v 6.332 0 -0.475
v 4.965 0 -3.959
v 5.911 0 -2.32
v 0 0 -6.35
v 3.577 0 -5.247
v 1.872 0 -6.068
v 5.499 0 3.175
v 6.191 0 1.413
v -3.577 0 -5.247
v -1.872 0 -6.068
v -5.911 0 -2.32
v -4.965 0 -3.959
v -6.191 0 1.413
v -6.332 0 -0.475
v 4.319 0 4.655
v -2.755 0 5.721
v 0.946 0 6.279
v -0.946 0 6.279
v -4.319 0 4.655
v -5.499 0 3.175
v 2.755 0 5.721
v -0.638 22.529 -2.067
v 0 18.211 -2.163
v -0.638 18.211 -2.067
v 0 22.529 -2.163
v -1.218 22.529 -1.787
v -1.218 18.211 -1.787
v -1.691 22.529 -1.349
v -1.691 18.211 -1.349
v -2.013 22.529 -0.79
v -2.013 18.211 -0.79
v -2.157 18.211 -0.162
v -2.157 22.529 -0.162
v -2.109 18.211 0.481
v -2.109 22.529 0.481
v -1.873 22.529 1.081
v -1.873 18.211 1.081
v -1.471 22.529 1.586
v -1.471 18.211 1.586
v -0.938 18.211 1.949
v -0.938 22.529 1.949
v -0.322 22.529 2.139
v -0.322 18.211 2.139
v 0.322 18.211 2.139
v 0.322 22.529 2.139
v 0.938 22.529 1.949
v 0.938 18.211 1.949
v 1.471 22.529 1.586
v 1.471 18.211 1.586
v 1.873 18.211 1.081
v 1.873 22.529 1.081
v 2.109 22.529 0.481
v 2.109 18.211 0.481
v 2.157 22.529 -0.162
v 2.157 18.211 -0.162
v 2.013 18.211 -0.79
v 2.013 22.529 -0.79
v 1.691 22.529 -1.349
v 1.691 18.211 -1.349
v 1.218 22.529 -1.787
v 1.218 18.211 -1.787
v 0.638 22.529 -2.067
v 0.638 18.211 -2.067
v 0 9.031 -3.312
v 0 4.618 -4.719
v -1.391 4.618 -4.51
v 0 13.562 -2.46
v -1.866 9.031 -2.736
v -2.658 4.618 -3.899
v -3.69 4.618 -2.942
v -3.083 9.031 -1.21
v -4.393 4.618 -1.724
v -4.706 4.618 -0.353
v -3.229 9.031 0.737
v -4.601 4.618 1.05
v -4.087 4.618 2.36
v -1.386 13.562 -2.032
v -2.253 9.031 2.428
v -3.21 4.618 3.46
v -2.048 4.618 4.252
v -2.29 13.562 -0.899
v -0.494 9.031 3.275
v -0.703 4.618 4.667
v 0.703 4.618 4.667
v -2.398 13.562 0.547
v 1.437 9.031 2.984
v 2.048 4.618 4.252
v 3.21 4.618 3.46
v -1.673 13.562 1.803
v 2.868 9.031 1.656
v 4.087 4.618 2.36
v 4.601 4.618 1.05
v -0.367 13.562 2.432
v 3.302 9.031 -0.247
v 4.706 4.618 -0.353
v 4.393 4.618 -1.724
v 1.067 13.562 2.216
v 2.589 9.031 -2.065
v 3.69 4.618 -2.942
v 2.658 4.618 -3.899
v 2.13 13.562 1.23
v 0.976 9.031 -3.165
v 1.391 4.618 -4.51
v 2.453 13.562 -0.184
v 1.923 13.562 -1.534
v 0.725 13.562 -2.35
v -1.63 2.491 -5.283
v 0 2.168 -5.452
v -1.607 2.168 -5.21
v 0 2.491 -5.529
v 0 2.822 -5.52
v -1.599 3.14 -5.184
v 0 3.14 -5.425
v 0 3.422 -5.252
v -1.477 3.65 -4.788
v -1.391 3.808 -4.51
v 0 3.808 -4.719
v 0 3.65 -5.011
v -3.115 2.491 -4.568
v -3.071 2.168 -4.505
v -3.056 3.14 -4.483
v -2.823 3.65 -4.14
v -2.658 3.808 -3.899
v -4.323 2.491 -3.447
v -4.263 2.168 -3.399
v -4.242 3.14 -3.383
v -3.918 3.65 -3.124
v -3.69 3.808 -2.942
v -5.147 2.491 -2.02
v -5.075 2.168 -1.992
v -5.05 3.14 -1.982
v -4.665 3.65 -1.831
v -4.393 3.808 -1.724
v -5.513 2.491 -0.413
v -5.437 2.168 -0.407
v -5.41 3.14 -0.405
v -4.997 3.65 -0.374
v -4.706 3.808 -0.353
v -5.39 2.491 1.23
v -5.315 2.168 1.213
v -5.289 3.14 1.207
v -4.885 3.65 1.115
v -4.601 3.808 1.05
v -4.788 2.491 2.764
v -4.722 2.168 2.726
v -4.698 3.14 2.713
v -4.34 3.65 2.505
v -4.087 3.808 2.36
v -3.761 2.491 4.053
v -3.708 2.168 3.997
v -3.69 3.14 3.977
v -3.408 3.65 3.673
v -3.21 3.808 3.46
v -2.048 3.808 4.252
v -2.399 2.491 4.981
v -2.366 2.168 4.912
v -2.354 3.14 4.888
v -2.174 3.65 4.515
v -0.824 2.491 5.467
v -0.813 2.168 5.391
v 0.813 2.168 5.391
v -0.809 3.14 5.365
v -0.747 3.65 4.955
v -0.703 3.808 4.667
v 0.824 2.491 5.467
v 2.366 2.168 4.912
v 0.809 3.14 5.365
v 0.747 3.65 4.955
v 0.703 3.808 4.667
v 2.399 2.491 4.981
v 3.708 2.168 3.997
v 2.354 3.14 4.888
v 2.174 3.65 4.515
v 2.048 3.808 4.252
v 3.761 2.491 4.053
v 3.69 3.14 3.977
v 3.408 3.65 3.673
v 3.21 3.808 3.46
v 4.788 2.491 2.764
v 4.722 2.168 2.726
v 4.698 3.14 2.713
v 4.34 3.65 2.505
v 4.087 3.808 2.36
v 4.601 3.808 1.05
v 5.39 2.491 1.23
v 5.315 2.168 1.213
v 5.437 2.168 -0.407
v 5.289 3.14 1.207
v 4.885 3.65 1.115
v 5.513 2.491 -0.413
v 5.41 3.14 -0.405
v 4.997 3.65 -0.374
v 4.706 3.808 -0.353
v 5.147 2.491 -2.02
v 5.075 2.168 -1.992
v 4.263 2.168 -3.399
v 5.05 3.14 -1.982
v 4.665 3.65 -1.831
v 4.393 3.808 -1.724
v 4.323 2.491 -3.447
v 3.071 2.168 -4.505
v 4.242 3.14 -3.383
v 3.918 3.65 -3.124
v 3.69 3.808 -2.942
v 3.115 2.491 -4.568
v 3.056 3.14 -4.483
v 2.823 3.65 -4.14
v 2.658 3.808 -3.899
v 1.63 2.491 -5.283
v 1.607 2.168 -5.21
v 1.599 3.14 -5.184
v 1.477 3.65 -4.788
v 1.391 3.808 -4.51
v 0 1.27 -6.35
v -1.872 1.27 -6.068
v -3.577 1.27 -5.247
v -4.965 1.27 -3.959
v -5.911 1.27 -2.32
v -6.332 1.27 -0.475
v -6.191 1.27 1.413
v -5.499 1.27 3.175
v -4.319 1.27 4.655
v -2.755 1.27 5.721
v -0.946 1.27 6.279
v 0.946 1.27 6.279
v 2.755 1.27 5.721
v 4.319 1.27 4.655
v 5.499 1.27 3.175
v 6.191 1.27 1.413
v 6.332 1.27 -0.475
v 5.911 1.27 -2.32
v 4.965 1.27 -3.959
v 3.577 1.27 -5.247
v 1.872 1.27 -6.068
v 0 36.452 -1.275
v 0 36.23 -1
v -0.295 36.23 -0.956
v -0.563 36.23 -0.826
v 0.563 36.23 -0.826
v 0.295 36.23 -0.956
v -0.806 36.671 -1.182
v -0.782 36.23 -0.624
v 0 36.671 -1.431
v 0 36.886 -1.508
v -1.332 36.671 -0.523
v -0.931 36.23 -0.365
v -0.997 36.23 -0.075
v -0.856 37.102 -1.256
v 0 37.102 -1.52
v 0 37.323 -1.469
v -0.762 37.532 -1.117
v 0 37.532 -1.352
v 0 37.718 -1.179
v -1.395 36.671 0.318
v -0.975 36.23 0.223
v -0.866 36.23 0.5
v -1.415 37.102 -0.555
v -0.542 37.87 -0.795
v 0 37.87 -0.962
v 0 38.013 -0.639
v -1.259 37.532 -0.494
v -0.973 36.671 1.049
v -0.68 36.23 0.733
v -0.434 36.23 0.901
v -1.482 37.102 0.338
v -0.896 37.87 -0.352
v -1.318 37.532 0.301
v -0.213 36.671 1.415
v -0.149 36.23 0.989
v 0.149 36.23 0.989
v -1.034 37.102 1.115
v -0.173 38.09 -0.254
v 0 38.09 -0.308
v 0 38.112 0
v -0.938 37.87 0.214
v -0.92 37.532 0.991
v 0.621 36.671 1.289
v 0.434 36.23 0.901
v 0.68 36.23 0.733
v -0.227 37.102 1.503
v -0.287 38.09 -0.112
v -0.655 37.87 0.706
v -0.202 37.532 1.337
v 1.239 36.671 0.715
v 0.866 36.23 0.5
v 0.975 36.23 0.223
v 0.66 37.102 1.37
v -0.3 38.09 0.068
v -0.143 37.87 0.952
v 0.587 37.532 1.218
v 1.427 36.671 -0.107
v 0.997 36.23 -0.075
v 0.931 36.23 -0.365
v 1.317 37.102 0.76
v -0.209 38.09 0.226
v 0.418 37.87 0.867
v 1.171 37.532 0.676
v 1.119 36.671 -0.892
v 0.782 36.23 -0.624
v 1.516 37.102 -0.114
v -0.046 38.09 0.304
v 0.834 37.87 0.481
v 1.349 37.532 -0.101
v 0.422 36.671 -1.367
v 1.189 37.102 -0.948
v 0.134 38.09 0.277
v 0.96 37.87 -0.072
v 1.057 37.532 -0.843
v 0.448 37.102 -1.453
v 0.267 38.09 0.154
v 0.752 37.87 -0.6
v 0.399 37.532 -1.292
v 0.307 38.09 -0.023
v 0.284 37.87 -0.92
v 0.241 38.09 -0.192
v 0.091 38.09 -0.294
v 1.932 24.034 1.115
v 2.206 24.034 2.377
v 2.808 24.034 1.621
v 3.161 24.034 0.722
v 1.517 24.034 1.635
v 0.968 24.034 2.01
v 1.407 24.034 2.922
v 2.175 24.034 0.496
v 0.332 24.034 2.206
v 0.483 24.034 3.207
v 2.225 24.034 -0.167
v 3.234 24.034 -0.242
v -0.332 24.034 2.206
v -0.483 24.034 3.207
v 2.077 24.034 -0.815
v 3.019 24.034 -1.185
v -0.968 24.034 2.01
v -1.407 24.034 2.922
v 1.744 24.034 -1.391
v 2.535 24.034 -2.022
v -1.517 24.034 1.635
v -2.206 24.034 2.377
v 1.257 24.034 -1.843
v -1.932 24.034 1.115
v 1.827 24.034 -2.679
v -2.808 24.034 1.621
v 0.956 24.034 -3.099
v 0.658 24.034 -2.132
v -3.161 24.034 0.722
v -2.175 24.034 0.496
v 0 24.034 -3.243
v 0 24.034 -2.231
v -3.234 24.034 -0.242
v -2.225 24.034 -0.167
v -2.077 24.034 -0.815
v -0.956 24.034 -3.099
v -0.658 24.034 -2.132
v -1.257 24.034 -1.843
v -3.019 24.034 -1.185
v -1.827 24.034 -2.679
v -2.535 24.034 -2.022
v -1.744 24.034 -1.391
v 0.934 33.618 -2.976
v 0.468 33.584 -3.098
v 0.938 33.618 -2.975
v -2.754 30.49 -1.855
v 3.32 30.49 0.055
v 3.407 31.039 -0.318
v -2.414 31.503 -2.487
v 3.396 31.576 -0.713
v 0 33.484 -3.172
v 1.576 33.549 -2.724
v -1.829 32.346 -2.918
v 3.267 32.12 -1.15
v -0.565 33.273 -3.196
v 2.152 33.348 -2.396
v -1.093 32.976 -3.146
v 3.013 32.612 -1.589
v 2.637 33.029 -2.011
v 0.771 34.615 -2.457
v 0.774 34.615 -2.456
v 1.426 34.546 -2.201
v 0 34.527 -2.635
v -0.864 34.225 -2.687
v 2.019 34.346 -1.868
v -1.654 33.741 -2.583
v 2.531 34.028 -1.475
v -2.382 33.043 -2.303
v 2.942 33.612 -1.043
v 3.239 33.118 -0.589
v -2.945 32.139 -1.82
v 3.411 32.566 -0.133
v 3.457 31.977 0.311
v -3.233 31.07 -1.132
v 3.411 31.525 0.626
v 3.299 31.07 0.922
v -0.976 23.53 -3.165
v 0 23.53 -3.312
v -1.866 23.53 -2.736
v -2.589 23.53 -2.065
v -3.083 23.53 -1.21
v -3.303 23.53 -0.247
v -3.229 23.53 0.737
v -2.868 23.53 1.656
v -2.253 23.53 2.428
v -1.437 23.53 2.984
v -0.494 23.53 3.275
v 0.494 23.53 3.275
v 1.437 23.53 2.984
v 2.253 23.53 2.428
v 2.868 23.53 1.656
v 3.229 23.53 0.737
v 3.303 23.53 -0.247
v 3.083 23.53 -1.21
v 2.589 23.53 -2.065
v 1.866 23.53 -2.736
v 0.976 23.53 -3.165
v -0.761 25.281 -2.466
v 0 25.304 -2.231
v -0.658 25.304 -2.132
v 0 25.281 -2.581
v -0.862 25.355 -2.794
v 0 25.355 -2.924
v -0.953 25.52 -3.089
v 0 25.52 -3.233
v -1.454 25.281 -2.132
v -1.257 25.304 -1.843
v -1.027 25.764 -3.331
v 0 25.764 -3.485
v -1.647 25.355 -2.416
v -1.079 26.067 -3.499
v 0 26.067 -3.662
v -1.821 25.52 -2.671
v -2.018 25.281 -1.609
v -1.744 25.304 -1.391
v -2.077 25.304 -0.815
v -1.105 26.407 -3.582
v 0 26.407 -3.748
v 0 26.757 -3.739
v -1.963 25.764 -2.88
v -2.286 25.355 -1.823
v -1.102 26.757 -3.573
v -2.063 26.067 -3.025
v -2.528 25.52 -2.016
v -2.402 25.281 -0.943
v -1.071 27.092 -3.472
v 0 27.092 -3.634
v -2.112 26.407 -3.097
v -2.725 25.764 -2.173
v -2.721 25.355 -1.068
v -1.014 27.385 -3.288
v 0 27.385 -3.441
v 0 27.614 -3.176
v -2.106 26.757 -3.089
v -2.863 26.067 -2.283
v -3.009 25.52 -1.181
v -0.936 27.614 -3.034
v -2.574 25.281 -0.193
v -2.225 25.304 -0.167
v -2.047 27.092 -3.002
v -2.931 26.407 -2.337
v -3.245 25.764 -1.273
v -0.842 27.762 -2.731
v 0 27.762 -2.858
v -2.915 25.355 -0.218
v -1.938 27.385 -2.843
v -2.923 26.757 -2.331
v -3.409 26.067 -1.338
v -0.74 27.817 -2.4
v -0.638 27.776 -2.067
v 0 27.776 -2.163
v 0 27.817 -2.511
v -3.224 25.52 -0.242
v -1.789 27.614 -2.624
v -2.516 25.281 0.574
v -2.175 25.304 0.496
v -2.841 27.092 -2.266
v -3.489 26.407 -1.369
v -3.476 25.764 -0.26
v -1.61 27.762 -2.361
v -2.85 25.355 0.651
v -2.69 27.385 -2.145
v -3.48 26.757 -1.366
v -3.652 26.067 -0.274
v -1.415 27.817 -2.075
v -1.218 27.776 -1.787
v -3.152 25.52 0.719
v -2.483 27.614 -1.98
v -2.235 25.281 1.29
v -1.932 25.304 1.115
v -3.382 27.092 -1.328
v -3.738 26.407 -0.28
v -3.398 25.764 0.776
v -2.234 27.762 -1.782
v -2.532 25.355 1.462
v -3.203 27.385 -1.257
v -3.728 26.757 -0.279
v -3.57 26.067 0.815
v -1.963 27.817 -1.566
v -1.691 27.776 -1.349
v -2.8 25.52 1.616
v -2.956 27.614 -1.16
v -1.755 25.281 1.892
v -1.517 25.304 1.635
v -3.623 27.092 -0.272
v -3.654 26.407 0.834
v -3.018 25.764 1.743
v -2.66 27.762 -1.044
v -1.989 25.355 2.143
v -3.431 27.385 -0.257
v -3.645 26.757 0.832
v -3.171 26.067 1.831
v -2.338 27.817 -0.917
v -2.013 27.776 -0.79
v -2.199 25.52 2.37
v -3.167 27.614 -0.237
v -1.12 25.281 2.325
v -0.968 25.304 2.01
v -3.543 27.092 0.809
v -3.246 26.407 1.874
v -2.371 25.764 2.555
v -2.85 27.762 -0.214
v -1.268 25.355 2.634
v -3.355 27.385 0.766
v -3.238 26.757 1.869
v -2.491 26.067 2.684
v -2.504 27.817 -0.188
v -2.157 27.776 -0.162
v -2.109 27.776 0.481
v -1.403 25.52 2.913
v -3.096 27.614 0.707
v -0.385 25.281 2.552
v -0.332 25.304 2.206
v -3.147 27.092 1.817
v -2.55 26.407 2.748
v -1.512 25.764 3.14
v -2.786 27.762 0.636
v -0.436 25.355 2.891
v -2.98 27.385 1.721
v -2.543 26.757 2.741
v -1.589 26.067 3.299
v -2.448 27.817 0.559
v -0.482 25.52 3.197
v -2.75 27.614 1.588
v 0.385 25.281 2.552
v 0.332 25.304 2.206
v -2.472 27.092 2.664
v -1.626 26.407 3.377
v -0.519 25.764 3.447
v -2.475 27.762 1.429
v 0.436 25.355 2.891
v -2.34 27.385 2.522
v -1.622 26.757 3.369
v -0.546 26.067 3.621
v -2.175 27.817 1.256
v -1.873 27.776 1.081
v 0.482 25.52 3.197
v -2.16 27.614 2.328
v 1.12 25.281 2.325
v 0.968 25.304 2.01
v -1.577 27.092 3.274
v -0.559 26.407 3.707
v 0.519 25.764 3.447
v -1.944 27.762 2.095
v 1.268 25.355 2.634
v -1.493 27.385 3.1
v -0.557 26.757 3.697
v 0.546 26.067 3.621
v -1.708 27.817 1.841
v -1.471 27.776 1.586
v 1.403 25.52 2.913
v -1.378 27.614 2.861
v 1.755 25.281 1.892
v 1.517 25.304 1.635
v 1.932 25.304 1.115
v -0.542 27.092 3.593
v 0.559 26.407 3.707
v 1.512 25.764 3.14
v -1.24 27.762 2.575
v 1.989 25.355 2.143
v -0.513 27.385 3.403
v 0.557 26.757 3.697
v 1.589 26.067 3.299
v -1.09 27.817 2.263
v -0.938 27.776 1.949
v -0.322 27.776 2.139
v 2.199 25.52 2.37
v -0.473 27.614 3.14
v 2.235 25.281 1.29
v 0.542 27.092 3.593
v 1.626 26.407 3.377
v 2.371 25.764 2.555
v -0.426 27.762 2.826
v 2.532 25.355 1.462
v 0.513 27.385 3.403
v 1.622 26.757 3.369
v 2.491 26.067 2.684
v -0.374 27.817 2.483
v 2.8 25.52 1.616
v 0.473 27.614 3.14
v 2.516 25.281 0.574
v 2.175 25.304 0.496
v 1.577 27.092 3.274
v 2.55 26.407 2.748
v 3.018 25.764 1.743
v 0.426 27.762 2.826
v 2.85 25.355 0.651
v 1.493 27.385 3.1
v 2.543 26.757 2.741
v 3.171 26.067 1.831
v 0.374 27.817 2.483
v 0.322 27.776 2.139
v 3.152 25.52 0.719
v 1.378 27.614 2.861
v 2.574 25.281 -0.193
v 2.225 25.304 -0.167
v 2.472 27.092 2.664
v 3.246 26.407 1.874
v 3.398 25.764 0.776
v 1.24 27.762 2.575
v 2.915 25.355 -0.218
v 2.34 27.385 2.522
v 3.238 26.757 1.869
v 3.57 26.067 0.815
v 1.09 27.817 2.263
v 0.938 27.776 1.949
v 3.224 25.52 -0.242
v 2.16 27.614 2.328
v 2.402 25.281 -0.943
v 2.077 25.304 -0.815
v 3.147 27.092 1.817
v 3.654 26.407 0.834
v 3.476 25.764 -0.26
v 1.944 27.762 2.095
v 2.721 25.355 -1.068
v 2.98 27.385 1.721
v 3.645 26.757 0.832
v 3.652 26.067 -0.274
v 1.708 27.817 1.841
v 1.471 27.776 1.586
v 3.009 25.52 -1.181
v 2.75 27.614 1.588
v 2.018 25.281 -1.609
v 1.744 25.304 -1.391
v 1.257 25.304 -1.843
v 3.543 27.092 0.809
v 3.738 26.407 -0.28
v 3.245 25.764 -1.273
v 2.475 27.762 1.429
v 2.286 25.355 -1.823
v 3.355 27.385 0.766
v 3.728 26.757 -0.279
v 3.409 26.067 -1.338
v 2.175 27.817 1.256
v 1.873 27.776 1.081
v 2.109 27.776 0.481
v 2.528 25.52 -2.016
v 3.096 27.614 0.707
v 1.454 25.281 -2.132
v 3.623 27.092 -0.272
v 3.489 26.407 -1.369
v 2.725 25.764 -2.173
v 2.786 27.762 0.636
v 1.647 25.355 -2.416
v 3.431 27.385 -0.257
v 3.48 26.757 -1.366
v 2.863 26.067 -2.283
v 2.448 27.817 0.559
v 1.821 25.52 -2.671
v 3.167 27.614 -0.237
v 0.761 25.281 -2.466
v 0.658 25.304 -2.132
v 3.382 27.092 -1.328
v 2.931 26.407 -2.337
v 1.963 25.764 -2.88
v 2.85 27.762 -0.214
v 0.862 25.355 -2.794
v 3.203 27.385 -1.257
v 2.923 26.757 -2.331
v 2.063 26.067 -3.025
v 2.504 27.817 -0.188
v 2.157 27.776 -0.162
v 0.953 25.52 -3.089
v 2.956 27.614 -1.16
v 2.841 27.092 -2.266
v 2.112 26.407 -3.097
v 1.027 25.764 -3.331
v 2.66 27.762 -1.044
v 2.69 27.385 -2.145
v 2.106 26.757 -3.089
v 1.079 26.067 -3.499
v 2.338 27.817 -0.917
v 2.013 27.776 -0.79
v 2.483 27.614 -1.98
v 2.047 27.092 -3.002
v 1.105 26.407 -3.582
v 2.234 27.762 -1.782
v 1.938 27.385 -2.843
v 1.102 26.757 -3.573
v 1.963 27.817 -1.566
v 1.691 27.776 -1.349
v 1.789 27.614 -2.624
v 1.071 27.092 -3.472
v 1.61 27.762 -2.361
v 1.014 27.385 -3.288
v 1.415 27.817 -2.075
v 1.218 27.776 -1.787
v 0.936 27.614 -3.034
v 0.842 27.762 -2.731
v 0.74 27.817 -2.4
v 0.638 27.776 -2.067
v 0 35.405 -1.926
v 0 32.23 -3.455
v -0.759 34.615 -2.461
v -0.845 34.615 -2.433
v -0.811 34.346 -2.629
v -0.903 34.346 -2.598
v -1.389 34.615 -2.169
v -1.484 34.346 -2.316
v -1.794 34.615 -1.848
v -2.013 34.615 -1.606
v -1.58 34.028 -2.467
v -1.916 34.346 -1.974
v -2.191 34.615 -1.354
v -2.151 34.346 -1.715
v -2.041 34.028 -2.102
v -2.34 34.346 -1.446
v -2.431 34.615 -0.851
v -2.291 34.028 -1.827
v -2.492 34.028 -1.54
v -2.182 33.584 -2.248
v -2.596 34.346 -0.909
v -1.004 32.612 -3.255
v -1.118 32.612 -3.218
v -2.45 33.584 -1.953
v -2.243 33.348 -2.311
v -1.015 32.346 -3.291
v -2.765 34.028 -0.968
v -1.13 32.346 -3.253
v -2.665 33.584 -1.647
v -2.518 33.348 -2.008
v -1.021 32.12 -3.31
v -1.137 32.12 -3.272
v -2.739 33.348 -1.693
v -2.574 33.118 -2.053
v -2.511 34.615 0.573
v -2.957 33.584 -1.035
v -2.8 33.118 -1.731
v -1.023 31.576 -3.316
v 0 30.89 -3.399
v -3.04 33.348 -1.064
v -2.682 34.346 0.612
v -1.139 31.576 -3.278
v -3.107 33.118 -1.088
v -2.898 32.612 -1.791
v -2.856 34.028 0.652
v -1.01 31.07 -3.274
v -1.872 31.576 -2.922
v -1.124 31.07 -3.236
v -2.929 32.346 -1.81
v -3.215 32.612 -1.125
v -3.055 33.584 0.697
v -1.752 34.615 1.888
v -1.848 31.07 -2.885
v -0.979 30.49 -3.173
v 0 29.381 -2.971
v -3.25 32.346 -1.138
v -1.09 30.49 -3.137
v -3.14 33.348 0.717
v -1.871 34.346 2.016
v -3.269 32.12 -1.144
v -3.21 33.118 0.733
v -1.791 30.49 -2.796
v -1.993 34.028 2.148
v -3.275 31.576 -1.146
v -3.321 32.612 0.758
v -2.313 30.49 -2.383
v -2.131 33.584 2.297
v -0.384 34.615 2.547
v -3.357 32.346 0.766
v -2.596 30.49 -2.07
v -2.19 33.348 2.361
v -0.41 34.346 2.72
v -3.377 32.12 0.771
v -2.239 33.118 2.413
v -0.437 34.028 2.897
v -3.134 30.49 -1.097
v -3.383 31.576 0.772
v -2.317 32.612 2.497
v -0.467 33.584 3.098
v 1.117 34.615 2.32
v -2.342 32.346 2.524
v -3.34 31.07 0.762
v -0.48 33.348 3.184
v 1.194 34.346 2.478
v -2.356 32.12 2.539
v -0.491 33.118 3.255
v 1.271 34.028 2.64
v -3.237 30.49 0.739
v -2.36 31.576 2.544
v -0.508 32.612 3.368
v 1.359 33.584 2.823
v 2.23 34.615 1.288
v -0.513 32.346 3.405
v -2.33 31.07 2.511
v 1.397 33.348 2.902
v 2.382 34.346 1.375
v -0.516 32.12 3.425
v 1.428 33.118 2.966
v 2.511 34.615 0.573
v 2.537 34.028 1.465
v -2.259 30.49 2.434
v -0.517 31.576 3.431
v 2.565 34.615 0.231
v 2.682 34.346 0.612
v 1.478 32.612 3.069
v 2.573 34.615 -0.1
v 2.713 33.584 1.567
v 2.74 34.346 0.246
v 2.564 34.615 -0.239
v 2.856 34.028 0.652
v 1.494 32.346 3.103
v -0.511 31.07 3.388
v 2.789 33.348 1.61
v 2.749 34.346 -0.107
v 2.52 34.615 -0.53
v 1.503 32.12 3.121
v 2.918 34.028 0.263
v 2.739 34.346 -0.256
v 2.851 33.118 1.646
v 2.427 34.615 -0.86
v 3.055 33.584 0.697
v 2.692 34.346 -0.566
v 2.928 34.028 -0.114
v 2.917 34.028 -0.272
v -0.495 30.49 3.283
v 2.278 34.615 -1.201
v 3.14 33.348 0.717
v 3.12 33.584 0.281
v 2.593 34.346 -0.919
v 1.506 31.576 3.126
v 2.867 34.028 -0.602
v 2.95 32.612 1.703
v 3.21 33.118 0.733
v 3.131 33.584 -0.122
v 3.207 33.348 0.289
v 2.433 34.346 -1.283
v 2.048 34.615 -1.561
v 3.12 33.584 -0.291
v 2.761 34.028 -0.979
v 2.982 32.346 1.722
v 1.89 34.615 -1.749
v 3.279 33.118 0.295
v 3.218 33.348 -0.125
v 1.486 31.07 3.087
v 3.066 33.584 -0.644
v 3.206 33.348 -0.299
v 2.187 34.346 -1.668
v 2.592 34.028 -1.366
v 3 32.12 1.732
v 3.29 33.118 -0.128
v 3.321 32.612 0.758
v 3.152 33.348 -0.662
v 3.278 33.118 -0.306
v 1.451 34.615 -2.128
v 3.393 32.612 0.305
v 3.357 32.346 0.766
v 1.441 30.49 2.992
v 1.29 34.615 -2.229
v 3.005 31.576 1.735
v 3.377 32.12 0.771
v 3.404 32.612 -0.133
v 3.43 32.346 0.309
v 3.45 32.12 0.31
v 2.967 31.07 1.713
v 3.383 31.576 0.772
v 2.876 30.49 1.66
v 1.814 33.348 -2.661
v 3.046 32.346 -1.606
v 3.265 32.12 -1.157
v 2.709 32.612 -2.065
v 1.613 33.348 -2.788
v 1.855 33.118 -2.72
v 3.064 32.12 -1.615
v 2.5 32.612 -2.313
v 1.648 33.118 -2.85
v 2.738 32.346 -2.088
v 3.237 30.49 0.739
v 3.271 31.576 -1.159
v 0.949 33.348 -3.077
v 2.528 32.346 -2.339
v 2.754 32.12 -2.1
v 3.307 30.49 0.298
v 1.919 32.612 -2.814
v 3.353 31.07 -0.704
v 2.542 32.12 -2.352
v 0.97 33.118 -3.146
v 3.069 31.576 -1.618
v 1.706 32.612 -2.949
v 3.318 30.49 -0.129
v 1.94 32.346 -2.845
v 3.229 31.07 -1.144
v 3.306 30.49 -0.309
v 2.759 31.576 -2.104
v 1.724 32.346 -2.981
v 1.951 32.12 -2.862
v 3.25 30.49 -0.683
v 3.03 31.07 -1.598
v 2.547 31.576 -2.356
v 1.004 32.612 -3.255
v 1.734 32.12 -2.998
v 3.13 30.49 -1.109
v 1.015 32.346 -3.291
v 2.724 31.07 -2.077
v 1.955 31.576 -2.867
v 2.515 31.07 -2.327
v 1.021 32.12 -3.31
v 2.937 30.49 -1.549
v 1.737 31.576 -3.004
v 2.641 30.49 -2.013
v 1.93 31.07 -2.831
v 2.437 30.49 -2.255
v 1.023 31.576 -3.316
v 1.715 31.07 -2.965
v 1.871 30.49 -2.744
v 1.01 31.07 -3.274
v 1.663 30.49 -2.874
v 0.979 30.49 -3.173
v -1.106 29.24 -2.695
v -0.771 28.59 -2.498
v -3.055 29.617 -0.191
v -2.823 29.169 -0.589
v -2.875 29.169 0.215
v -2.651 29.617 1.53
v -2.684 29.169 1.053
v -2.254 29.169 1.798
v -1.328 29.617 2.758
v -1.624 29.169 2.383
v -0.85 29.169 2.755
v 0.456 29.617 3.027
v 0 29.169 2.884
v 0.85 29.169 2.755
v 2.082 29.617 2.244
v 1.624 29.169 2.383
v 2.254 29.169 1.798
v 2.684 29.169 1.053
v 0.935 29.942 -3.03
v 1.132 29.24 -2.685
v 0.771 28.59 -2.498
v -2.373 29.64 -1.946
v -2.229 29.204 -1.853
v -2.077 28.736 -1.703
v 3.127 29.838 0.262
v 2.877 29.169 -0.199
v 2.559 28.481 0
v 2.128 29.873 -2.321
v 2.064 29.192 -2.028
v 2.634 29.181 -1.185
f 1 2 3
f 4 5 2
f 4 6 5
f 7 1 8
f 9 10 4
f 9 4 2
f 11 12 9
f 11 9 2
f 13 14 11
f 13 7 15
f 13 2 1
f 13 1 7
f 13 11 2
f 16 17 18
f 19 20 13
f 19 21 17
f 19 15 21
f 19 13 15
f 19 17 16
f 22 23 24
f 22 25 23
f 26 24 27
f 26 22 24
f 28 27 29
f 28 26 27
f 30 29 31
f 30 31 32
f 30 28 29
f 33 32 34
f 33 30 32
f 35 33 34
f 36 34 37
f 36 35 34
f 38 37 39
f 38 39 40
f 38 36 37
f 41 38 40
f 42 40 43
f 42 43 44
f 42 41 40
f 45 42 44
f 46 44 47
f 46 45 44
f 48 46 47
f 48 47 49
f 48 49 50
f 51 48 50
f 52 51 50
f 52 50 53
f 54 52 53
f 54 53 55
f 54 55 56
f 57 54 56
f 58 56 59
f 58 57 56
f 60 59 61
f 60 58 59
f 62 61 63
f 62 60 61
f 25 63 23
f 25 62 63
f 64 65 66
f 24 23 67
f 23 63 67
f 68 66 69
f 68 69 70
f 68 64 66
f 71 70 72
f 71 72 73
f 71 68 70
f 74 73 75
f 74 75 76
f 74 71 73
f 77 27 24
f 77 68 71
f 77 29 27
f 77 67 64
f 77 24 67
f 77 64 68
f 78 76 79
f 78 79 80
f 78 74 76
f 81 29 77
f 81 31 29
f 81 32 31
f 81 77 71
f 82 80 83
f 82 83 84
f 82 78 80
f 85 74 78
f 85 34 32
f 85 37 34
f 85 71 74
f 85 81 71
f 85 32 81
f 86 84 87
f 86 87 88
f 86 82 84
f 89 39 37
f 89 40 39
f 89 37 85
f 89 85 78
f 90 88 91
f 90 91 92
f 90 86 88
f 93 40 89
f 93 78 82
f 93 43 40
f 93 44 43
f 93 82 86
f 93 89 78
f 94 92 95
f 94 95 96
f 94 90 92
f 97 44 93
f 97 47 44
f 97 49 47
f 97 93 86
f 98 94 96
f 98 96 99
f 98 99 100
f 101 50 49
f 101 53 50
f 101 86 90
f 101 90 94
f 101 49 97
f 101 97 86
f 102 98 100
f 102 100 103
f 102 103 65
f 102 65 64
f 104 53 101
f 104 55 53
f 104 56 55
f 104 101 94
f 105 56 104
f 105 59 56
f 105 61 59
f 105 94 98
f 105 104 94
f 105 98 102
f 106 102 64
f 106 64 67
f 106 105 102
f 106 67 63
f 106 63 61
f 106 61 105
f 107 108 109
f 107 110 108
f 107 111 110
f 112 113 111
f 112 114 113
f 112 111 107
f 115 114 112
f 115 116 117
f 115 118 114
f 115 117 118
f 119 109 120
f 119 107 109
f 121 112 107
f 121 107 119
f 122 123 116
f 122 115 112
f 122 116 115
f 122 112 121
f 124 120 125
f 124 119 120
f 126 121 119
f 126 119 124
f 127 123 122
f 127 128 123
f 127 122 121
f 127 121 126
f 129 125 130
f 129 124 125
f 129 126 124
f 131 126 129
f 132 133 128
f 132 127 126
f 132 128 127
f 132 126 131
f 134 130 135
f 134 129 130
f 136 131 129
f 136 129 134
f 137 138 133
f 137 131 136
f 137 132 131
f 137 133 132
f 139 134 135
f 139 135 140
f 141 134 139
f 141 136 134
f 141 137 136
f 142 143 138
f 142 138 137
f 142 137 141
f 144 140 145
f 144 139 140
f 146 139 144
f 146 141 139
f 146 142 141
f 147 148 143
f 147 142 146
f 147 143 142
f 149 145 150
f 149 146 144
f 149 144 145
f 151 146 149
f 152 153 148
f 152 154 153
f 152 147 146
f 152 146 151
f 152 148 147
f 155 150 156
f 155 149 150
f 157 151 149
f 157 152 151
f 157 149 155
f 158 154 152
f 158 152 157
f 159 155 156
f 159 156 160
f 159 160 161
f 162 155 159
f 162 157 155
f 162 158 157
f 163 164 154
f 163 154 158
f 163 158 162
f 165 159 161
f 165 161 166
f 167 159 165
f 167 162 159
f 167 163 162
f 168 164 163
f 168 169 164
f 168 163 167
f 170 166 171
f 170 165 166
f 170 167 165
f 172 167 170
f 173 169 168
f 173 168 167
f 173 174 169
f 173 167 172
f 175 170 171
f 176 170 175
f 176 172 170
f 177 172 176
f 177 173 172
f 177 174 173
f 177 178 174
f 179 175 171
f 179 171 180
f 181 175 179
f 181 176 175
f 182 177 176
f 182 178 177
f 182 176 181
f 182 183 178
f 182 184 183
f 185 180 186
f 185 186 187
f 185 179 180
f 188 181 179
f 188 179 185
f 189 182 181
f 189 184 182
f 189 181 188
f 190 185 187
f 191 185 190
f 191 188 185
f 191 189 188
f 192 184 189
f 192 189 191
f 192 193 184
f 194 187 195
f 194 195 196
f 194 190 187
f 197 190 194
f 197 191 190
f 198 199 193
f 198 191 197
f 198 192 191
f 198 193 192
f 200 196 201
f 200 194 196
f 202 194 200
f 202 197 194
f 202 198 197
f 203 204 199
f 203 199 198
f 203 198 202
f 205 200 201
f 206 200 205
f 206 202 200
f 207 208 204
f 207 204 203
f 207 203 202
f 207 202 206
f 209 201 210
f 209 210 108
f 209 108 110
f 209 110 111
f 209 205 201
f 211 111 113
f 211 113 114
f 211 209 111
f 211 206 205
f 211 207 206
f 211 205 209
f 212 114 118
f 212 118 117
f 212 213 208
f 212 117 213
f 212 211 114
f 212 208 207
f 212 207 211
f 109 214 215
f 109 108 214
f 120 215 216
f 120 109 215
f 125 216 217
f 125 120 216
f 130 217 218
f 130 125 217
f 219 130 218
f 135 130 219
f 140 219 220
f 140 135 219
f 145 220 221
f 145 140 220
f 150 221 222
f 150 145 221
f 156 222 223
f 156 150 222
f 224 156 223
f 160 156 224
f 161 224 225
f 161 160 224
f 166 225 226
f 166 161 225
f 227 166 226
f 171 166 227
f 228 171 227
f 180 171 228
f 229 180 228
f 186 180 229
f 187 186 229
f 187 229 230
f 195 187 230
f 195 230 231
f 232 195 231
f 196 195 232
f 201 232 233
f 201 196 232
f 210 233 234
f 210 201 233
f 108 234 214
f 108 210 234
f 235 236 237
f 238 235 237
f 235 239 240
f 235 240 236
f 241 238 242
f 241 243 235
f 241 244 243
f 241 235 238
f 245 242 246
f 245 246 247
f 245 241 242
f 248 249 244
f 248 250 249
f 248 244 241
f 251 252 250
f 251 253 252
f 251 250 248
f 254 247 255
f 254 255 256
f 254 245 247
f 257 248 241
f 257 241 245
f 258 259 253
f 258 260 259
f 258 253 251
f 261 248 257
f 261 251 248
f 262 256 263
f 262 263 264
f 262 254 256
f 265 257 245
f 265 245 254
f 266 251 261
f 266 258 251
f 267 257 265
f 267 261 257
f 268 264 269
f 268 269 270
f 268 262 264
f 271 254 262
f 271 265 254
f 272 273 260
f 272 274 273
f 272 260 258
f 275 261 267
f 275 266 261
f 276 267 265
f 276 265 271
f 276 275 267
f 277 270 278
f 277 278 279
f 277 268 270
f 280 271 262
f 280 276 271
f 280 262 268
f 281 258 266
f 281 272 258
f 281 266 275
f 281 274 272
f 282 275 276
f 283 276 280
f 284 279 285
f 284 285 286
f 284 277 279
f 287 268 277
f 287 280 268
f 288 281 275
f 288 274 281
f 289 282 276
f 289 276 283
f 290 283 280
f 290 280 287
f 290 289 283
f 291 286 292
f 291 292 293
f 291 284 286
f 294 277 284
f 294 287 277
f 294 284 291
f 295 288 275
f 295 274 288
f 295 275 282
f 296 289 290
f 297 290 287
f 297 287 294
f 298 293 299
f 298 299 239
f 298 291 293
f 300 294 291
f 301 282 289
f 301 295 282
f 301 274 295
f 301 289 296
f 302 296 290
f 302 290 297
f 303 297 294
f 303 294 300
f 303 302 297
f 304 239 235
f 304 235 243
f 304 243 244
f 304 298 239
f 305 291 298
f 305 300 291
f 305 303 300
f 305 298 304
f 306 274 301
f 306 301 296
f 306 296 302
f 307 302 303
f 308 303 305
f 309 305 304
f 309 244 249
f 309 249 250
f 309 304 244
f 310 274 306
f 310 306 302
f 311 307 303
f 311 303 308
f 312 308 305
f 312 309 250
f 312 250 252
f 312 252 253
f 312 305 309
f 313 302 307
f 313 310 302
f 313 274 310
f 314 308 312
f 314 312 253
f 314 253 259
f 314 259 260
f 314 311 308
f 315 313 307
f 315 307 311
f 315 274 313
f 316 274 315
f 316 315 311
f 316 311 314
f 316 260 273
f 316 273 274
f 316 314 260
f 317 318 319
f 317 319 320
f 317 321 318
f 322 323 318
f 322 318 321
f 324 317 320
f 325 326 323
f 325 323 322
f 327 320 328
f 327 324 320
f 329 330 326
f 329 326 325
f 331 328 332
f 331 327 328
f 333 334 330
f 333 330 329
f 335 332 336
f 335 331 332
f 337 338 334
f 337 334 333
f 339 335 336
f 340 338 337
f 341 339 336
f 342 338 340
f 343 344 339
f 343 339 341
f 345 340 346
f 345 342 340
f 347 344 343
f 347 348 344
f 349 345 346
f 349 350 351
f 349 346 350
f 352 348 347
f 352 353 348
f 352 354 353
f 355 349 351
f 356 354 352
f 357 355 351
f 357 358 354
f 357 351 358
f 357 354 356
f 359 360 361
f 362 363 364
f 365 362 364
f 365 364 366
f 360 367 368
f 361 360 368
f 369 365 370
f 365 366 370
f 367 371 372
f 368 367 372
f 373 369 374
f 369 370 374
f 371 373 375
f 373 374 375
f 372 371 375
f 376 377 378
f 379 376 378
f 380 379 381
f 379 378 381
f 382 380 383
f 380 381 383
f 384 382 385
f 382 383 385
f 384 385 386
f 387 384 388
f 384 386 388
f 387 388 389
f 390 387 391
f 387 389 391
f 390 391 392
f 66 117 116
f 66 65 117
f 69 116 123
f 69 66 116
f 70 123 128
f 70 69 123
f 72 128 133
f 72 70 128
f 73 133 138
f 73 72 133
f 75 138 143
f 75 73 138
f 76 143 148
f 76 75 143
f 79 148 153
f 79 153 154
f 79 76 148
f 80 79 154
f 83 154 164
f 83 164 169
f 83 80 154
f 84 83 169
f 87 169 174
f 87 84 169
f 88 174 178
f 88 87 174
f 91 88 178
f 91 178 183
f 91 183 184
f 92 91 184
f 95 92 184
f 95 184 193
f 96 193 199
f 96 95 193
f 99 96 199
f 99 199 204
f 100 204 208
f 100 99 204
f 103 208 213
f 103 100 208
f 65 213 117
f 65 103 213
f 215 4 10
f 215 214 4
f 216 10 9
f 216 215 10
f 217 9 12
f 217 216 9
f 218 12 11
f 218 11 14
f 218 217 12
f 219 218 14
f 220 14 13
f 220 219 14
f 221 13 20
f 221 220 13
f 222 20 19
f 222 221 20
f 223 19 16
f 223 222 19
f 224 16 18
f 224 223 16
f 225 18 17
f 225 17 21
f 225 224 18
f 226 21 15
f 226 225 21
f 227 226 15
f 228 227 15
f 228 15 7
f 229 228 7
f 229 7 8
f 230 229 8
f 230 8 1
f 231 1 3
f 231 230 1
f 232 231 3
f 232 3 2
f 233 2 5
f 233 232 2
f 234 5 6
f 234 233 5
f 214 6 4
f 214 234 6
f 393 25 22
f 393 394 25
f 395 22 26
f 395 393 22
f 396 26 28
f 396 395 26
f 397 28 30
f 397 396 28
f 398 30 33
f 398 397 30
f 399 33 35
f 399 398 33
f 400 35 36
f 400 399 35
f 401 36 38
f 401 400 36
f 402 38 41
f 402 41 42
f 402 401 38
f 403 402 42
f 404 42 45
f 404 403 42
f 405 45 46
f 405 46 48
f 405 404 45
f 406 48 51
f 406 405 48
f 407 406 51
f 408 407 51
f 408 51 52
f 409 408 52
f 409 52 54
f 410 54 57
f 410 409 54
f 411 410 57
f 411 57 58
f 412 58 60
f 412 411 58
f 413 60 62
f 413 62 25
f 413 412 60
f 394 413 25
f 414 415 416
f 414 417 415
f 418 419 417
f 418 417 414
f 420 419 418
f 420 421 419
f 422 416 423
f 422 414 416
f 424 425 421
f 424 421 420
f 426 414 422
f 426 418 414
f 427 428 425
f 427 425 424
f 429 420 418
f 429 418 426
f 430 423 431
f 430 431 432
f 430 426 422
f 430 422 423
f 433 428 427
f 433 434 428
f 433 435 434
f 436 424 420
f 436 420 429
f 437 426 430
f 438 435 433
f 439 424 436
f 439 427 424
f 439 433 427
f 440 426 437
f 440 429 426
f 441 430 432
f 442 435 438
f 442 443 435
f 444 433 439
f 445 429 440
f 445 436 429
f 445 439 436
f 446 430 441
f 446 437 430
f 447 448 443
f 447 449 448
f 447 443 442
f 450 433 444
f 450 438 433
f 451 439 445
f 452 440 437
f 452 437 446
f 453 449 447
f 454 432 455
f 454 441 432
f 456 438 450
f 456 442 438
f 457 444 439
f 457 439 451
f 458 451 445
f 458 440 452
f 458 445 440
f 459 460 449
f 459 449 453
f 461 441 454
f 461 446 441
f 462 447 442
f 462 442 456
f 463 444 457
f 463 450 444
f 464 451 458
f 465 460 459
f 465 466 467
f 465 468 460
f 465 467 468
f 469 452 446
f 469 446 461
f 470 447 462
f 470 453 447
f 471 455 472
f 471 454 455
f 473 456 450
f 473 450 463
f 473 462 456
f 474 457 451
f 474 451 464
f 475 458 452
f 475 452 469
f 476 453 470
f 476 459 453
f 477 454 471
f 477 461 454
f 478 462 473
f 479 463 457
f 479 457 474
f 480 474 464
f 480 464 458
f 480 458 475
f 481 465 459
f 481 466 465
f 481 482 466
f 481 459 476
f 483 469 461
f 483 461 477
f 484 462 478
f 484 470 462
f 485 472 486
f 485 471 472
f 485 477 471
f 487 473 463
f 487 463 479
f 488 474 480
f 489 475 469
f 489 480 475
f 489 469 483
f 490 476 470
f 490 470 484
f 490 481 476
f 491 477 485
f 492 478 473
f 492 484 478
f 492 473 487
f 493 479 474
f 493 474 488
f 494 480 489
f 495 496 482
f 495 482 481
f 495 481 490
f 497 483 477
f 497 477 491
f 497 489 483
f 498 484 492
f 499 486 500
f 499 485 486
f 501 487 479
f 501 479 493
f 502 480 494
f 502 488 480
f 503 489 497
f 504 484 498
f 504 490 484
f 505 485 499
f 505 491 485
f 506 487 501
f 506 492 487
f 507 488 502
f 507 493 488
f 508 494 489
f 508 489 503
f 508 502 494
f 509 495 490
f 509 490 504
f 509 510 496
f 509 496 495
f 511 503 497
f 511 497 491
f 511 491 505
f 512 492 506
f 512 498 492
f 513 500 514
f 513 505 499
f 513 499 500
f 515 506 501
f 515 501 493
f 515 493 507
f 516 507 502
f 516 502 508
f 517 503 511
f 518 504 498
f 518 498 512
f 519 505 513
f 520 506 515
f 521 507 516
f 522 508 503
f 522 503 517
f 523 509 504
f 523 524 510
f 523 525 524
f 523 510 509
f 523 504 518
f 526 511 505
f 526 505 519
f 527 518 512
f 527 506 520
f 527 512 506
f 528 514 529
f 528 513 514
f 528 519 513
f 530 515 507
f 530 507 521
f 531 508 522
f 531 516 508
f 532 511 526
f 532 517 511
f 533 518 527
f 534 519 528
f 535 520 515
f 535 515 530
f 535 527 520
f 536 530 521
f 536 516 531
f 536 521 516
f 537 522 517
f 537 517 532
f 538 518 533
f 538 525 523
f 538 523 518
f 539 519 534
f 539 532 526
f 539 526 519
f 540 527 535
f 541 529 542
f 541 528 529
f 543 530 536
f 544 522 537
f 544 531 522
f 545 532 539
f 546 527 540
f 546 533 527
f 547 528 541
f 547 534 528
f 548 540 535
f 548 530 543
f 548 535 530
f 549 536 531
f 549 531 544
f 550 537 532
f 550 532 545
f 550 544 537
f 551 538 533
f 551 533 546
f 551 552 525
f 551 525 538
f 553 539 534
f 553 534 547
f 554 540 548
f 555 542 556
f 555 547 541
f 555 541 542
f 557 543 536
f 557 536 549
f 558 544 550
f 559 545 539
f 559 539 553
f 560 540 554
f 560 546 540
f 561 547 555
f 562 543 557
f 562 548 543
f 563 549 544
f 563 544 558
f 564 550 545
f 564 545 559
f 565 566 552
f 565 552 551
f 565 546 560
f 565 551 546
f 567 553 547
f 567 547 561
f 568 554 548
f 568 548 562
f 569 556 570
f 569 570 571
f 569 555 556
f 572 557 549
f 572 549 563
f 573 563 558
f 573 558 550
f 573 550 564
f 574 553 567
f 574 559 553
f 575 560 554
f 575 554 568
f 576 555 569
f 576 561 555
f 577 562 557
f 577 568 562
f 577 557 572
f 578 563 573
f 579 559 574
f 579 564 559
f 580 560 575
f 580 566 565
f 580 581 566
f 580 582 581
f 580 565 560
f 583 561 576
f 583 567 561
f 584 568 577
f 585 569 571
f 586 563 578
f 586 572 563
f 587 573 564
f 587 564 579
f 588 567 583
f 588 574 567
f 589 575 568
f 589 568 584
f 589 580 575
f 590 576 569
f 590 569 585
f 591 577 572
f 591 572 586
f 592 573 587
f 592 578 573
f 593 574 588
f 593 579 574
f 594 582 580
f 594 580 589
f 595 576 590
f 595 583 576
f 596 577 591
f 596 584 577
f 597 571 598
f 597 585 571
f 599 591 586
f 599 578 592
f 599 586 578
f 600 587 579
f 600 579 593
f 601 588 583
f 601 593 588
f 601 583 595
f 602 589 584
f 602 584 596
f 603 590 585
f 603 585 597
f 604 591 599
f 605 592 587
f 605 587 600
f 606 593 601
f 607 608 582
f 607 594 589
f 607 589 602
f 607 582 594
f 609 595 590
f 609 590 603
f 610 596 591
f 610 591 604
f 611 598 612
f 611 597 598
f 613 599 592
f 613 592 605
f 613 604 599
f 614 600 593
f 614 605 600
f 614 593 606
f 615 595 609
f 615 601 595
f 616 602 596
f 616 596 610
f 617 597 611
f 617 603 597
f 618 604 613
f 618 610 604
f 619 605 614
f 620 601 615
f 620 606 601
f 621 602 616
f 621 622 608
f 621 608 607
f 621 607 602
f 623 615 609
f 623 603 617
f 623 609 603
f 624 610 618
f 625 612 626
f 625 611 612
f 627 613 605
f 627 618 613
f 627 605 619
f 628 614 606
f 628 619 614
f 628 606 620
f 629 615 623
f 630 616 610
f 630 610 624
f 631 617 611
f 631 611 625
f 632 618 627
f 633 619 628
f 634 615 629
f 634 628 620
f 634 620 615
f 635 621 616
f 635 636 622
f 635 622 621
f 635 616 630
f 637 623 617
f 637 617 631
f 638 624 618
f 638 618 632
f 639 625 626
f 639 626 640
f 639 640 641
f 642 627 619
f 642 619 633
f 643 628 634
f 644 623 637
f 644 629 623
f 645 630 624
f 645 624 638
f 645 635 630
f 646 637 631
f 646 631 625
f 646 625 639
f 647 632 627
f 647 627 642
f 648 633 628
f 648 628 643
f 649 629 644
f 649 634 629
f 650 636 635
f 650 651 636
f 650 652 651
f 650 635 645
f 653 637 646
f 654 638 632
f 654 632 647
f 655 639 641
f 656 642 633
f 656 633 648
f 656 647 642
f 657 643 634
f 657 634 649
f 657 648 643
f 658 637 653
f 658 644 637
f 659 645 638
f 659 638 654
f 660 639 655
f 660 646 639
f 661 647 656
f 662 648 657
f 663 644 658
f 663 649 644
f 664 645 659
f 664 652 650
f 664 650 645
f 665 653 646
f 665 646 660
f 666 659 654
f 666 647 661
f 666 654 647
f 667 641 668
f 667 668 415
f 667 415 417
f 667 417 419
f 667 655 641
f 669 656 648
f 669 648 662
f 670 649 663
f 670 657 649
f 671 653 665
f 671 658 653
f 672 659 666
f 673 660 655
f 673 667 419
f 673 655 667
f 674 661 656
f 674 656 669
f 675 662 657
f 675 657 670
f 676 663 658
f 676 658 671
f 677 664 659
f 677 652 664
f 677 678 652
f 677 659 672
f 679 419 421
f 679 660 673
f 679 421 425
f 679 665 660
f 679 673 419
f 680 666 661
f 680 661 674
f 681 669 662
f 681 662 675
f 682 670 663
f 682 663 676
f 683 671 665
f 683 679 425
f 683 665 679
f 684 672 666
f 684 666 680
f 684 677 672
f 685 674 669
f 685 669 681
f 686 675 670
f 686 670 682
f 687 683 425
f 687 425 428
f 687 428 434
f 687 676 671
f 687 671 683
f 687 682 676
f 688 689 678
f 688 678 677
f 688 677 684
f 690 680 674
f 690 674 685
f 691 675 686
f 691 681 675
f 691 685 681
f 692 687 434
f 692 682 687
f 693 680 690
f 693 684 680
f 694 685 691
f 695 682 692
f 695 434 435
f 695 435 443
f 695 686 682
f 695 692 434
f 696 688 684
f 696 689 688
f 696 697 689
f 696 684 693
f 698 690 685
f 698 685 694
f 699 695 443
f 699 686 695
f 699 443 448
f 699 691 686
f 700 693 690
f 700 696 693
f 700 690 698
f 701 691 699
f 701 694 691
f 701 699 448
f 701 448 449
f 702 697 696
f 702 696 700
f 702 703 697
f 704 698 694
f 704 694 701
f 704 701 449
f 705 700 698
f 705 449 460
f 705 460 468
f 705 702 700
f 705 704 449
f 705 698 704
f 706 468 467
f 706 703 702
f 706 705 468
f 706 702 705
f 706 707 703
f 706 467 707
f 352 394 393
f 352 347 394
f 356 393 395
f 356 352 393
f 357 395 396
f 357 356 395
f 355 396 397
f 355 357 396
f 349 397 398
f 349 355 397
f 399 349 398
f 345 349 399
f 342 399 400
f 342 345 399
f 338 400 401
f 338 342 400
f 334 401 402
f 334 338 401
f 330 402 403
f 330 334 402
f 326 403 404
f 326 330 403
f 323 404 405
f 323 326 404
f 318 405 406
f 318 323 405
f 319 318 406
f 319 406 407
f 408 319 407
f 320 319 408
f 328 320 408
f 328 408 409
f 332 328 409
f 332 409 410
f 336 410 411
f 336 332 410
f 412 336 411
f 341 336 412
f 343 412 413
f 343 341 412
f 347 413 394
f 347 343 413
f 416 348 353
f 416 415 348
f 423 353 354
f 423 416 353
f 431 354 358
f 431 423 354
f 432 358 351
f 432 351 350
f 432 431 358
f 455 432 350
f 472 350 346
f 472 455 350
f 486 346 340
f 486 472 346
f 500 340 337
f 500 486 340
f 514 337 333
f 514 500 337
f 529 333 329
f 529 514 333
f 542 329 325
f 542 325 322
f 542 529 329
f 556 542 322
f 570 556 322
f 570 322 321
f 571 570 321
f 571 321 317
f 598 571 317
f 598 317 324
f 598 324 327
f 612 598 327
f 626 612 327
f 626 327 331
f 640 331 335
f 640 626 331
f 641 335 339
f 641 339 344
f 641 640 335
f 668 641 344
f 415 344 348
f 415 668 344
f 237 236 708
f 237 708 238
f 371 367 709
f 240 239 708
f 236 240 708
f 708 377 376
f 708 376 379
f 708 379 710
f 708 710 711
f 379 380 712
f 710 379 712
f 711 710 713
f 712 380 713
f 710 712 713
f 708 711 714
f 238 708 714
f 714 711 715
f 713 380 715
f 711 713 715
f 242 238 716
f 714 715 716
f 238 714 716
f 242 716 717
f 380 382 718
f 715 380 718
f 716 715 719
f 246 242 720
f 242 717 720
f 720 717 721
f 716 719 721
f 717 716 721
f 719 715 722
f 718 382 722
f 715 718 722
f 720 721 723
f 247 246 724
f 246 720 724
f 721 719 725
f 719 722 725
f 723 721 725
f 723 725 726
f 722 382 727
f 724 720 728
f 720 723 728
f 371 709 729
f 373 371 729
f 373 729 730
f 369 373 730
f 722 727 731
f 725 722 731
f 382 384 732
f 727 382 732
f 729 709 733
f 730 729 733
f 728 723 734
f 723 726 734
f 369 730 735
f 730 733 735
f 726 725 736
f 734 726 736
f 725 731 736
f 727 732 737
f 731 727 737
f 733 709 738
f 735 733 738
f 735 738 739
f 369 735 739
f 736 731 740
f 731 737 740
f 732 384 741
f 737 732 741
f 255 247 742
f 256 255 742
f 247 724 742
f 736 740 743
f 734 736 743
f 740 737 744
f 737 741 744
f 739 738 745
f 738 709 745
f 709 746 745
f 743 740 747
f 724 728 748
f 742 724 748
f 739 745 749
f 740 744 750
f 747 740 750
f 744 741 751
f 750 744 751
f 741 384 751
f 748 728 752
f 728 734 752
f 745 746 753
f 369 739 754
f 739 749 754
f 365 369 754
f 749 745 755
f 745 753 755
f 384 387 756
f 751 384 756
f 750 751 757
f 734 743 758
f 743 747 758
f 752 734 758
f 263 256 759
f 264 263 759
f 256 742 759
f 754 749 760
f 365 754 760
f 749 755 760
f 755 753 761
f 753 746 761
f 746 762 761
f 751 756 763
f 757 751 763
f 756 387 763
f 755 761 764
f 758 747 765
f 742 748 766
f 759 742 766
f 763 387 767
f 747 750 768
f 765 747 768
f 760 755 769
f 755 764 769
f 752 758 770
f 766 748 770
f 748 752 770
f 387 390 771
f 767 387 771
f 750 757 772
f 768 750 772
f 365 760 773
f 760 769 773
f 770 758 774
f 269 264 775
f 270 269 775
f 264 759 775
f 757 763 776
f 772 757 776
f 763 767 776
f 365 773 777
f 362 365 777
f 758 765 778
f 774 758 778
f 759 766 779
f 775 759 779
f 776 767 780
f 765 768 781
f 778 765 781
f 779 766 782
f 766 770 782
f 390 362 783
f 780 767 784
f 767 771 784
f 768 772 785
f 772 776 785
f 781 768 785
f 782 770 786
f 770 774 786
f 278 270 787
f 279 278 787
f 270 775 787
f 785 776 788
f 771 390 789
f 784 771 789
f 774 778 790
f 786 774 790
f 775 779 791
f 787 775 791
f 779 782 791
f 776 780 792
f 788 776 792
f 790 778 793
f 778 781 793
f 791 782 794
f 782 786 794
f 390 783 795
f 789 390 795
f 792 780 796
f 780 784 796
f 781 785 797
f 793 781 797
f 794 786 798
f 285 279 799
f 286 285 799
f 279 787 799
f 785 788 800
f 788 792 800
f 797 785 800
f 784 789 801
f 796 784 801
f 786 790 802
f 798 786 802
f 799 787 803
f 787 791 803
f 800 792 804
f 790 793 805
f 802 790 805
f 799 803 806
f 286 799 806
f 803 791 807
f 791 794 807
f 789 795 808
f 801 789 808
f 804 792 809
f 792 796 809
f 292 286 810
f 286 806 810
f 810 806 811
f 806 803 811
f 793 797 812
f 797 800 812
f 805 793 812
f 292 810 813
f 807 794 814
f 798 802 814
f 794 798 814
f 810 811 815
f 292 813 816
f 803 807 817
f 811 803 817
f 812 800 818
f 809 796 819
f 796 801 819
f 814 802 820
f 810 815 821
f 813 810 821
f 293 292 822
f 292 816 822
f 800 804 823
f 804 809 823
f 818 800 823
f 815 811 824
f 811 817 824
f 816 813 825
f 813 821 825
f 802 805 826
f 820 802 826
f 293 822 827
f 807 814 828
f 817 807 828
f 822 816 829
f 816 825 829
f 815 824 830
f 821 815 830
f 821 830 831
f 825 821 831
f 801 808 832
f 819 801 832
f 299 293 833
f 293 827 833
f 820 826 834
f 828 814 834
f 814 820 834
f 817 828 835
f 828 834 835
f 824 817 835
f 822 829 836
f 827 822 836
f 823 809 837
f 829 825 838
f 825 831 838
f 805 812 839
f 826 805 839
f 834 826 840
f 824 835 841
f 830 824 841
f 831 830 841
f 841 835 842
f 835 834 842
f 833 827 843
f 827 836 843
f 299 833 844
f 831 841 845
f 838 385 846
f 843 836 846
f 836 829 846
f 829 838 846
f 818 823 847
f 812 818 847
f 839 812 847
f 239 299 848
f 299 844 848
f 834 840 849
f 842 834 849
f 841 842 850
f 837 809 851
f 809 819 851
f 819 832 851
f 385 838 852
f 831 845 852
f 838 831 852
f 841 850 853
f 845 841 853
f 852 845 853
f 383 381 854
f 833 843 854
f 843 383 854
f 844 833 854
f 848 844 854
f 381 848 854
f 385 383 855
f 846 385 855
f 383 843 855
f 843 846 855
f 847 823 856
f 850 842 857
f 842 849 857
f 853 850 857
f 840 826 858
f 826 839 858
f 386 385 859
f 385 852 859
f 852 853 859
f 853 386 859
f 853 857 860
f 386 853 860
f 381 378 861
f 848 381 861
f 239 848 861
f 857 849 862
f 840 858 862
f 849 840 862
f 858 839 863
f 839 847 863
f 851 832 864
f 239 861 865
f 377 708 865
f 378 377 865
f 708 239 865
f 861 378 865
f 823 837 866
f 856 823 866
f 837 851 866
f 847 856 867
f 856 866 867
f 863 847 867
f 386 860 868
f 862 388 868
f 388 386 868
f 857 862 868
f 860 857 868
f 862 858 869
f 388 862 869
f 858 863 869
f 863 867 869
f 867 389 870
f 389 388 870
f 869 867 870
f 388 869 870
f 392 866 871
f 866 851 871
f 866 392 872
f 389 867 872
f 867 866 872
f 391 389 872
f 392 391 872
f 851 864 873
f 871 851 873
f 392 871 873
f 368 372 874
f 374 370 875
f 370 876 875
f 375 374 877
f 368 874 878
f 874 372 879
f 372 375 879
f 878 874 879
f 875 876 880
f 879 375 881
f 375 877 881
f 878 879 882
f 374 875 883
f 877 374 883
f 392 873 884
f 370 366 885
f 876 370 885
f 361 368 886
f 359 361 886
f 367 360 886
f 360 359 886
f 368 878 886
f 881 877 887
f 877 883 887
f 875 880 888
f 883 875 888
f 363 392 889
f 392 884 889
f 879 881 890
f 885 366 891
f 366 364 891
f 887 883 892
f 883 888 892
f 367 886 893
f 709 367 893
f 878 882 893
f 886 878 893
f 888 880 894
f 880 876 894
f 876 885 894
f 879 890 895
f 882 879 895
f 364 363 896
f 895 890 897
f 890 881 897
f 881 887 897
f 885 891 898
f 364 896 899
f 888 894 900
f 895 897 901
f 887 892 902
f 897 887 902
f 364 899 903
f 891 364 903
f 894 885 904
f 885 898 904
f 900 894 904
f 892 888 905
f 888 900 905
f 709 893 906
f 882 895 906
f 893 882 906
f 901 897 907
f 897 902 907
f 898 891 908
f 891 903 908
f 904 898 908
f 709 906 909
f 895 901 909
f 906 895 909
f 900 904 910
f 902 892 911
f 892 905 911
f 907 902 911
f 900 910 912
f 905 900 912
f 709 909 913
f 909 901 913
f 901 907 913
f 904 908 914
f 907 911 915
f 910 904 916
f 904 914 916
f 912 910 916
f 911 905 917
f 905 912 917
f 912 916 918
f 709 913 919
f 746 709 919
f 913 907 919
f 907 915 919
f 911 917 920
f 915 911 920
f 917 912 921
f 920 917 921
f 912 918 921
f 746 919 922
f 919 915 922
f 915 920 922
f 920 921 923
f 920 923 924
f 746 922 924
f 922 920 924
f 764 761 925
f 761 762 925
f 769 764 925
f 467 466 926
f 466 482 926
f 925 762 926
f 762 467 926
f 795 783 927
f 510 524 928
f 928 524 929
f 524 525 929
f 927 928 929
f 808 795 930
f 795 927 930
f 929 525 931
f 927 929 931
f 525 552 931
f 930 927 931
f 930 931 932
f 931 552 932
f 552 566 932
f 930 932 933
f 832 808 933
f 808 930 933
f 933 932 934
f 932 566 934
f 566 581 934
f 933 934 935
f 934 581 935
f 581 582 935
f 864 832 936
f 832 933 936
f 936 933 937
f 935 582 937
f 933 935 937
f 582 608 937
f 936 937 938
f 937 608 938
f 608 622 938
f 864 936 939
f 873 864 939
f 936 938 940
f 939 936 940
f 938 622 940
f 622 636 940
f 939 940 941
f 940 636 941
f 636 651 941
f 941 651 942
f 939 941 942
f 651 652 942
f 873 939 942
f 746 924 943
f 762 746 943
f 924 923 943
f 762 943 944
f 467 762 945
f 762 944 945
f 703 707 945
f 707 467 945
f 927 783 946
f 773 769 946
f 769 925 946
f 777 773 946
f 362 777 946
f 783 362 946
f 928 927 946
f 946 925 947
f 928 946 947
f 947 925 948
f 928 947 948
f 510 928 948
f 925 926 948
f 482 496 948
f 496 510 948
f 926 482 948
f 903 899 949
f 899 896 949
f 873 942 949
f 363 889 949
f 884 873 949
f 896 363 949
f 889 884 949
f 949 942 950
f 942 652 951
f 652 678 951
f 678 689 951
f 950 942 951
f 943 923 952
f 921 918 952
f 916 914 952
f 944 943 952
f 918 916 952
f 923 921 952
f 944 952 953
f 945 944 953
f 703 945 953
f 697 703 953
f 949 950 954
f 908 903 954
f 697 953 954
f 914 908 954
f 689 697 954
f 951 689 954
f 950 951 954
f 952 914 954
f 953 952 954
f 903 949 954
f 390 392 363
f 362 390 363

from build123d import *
from OCP.BRepAlgoAPI import BRepAlgoAPI_Cut
from OCP.TopTools import TopTools_ListOfShape

# Parameters (mm, degrees)
CUT_EXTRUDE1_DEPTH      = 5.842
CUT_EXTRUDE1_DEPTH_BACK = 7.112


with BuildPart() as part:
    # Sketch1 → Revolve1 (revolve)
    with BuildSketch(Plane.XY):
        with BuildLine():
            Line((0, 0), (6.35, 0))
            Line((6.35, 0), (6.35, 1.27))
            Line((6.35, 1.27), (5.451974388, 2.168025612))
            ThreePointArc((5.451974388, 2.168025612), (5.425268168, 3.139674583), (4.719324443, 3.807850011))
            Line((4.719324443, 3.807850011), (4.719324443, 4.618157389))
            add(Edge.make_bspline(
                [(4.719324443, 4.618157389), (2.191207341, 11.149425628), (2.162945217, 18.210926818)],
                knots=[0, 0, 0, 1, 1, 1], degree=2))
            Line((2.162945217, 18.210926818), (2.162945217, 22.528926818))
            Line((2.162945217, 22.528926818), (3.311767534, 23.530317493))
            Line((3.311767534, 23.530317493), (3.242795694, 24.033613514))
            Line((3.242795694, 24.033613514), (2.230740911, 24.033613514))
            Line((2.230740911, 24.033613514), (2.230740911, 25.303613514))
            ThreePointArc((2.230740911, 25.303613514), (3.755743451, 26.582465667), (2.162945217, 27.77581782))
            add(Edge.make_bspline(
                [(1.000273268, 36.229714038), (5.275414498, 32.931450332), (2.162945217, 27.77581782)],
                knots=[0, 0, 0, 1, 1, 1], degree=2))
            add(Edge.make_bspline(
                [(1.000273268, 36.229714038), (4.067898527, 38.111819372), (0, 38.111819372)],
                knots=[5.428894031, 5.428894031, 5.428894031, 7.853981634, 7.853981634, 7.853981634], degree=2, weights=[1, 0.35063824, 1]))
            Line((0, 38.111819372), (0, 38.1))
            Line((0, 38.1), (0, 0))
        make_face()
    revolve(axis=Axis((0, 0, 0), (0, 1, 0)))


with BuildPart() as cut_extrude1_tool:
    # Sketch3 → Cut-Extrude1 (new, two sides: drawn at the far end of the back side and taken through both)
    with BuildSketch(Plane(origin=(-3.227609174, 24.033613514, -0.313469186), x_dir=(-0.29997267443447917, 0, 0.9539477944796696), z_dir=(-0.9539477944796697, 0, -0.29997267443447917)).offset(-CUT_EXTRUDE1_DEPTH_BACK)):
        with BuildLine():
            Line((-3.24447126, 10.581689828), (-0.778987351, 7.036762029))
            Line((-0.778987351, 7.036762029), (-1.61308801, 6.456648169))
            Line((-1.61308801, 6.456648169), (-3.788514988, 9.584525638))
            ThreePointArc((-3.788514988, 9.584525638), (-3.824633805, 10.251226491), (-3.24447126, 10.581689828))
        make_face()
    extrude(amount=CUT_EXTRUDE1_DEPTH + CUT_EXTRUDE1_DEPTH_BACK)


with BuildPart() as part_1:
    add(part.part)

    # Cut-Extrude1: cut by cut_extrude1_tool, with a tolerance
    cut_extrude1_stock = TopTools_ListOfShape()
    cut_extrude1_stock.Append(part_1.part.wrapped)
    cut_extrude1_tools = TopTools_ListOfShape()
    cut_extrude1_tools.Append(cut_extrude1_tool.part.wrapped)
    cut_extrude1_cut = BRepAlgoAPI_Cut()
    cut_extrude1_cut.SetArguments(cut_extrude1_stock)
    cut_extrude1_cut.SetTools(cut_extrude1_tools)
    cut_extrude1_cut.SetFuzzyValue(0.00001)
    cut_extrude1_cut.Build()
    add(Compound.cast(cut_extrude1_cut.Shape()).solids(), mode=Mode.REPLACE)


solid = part_1.part
